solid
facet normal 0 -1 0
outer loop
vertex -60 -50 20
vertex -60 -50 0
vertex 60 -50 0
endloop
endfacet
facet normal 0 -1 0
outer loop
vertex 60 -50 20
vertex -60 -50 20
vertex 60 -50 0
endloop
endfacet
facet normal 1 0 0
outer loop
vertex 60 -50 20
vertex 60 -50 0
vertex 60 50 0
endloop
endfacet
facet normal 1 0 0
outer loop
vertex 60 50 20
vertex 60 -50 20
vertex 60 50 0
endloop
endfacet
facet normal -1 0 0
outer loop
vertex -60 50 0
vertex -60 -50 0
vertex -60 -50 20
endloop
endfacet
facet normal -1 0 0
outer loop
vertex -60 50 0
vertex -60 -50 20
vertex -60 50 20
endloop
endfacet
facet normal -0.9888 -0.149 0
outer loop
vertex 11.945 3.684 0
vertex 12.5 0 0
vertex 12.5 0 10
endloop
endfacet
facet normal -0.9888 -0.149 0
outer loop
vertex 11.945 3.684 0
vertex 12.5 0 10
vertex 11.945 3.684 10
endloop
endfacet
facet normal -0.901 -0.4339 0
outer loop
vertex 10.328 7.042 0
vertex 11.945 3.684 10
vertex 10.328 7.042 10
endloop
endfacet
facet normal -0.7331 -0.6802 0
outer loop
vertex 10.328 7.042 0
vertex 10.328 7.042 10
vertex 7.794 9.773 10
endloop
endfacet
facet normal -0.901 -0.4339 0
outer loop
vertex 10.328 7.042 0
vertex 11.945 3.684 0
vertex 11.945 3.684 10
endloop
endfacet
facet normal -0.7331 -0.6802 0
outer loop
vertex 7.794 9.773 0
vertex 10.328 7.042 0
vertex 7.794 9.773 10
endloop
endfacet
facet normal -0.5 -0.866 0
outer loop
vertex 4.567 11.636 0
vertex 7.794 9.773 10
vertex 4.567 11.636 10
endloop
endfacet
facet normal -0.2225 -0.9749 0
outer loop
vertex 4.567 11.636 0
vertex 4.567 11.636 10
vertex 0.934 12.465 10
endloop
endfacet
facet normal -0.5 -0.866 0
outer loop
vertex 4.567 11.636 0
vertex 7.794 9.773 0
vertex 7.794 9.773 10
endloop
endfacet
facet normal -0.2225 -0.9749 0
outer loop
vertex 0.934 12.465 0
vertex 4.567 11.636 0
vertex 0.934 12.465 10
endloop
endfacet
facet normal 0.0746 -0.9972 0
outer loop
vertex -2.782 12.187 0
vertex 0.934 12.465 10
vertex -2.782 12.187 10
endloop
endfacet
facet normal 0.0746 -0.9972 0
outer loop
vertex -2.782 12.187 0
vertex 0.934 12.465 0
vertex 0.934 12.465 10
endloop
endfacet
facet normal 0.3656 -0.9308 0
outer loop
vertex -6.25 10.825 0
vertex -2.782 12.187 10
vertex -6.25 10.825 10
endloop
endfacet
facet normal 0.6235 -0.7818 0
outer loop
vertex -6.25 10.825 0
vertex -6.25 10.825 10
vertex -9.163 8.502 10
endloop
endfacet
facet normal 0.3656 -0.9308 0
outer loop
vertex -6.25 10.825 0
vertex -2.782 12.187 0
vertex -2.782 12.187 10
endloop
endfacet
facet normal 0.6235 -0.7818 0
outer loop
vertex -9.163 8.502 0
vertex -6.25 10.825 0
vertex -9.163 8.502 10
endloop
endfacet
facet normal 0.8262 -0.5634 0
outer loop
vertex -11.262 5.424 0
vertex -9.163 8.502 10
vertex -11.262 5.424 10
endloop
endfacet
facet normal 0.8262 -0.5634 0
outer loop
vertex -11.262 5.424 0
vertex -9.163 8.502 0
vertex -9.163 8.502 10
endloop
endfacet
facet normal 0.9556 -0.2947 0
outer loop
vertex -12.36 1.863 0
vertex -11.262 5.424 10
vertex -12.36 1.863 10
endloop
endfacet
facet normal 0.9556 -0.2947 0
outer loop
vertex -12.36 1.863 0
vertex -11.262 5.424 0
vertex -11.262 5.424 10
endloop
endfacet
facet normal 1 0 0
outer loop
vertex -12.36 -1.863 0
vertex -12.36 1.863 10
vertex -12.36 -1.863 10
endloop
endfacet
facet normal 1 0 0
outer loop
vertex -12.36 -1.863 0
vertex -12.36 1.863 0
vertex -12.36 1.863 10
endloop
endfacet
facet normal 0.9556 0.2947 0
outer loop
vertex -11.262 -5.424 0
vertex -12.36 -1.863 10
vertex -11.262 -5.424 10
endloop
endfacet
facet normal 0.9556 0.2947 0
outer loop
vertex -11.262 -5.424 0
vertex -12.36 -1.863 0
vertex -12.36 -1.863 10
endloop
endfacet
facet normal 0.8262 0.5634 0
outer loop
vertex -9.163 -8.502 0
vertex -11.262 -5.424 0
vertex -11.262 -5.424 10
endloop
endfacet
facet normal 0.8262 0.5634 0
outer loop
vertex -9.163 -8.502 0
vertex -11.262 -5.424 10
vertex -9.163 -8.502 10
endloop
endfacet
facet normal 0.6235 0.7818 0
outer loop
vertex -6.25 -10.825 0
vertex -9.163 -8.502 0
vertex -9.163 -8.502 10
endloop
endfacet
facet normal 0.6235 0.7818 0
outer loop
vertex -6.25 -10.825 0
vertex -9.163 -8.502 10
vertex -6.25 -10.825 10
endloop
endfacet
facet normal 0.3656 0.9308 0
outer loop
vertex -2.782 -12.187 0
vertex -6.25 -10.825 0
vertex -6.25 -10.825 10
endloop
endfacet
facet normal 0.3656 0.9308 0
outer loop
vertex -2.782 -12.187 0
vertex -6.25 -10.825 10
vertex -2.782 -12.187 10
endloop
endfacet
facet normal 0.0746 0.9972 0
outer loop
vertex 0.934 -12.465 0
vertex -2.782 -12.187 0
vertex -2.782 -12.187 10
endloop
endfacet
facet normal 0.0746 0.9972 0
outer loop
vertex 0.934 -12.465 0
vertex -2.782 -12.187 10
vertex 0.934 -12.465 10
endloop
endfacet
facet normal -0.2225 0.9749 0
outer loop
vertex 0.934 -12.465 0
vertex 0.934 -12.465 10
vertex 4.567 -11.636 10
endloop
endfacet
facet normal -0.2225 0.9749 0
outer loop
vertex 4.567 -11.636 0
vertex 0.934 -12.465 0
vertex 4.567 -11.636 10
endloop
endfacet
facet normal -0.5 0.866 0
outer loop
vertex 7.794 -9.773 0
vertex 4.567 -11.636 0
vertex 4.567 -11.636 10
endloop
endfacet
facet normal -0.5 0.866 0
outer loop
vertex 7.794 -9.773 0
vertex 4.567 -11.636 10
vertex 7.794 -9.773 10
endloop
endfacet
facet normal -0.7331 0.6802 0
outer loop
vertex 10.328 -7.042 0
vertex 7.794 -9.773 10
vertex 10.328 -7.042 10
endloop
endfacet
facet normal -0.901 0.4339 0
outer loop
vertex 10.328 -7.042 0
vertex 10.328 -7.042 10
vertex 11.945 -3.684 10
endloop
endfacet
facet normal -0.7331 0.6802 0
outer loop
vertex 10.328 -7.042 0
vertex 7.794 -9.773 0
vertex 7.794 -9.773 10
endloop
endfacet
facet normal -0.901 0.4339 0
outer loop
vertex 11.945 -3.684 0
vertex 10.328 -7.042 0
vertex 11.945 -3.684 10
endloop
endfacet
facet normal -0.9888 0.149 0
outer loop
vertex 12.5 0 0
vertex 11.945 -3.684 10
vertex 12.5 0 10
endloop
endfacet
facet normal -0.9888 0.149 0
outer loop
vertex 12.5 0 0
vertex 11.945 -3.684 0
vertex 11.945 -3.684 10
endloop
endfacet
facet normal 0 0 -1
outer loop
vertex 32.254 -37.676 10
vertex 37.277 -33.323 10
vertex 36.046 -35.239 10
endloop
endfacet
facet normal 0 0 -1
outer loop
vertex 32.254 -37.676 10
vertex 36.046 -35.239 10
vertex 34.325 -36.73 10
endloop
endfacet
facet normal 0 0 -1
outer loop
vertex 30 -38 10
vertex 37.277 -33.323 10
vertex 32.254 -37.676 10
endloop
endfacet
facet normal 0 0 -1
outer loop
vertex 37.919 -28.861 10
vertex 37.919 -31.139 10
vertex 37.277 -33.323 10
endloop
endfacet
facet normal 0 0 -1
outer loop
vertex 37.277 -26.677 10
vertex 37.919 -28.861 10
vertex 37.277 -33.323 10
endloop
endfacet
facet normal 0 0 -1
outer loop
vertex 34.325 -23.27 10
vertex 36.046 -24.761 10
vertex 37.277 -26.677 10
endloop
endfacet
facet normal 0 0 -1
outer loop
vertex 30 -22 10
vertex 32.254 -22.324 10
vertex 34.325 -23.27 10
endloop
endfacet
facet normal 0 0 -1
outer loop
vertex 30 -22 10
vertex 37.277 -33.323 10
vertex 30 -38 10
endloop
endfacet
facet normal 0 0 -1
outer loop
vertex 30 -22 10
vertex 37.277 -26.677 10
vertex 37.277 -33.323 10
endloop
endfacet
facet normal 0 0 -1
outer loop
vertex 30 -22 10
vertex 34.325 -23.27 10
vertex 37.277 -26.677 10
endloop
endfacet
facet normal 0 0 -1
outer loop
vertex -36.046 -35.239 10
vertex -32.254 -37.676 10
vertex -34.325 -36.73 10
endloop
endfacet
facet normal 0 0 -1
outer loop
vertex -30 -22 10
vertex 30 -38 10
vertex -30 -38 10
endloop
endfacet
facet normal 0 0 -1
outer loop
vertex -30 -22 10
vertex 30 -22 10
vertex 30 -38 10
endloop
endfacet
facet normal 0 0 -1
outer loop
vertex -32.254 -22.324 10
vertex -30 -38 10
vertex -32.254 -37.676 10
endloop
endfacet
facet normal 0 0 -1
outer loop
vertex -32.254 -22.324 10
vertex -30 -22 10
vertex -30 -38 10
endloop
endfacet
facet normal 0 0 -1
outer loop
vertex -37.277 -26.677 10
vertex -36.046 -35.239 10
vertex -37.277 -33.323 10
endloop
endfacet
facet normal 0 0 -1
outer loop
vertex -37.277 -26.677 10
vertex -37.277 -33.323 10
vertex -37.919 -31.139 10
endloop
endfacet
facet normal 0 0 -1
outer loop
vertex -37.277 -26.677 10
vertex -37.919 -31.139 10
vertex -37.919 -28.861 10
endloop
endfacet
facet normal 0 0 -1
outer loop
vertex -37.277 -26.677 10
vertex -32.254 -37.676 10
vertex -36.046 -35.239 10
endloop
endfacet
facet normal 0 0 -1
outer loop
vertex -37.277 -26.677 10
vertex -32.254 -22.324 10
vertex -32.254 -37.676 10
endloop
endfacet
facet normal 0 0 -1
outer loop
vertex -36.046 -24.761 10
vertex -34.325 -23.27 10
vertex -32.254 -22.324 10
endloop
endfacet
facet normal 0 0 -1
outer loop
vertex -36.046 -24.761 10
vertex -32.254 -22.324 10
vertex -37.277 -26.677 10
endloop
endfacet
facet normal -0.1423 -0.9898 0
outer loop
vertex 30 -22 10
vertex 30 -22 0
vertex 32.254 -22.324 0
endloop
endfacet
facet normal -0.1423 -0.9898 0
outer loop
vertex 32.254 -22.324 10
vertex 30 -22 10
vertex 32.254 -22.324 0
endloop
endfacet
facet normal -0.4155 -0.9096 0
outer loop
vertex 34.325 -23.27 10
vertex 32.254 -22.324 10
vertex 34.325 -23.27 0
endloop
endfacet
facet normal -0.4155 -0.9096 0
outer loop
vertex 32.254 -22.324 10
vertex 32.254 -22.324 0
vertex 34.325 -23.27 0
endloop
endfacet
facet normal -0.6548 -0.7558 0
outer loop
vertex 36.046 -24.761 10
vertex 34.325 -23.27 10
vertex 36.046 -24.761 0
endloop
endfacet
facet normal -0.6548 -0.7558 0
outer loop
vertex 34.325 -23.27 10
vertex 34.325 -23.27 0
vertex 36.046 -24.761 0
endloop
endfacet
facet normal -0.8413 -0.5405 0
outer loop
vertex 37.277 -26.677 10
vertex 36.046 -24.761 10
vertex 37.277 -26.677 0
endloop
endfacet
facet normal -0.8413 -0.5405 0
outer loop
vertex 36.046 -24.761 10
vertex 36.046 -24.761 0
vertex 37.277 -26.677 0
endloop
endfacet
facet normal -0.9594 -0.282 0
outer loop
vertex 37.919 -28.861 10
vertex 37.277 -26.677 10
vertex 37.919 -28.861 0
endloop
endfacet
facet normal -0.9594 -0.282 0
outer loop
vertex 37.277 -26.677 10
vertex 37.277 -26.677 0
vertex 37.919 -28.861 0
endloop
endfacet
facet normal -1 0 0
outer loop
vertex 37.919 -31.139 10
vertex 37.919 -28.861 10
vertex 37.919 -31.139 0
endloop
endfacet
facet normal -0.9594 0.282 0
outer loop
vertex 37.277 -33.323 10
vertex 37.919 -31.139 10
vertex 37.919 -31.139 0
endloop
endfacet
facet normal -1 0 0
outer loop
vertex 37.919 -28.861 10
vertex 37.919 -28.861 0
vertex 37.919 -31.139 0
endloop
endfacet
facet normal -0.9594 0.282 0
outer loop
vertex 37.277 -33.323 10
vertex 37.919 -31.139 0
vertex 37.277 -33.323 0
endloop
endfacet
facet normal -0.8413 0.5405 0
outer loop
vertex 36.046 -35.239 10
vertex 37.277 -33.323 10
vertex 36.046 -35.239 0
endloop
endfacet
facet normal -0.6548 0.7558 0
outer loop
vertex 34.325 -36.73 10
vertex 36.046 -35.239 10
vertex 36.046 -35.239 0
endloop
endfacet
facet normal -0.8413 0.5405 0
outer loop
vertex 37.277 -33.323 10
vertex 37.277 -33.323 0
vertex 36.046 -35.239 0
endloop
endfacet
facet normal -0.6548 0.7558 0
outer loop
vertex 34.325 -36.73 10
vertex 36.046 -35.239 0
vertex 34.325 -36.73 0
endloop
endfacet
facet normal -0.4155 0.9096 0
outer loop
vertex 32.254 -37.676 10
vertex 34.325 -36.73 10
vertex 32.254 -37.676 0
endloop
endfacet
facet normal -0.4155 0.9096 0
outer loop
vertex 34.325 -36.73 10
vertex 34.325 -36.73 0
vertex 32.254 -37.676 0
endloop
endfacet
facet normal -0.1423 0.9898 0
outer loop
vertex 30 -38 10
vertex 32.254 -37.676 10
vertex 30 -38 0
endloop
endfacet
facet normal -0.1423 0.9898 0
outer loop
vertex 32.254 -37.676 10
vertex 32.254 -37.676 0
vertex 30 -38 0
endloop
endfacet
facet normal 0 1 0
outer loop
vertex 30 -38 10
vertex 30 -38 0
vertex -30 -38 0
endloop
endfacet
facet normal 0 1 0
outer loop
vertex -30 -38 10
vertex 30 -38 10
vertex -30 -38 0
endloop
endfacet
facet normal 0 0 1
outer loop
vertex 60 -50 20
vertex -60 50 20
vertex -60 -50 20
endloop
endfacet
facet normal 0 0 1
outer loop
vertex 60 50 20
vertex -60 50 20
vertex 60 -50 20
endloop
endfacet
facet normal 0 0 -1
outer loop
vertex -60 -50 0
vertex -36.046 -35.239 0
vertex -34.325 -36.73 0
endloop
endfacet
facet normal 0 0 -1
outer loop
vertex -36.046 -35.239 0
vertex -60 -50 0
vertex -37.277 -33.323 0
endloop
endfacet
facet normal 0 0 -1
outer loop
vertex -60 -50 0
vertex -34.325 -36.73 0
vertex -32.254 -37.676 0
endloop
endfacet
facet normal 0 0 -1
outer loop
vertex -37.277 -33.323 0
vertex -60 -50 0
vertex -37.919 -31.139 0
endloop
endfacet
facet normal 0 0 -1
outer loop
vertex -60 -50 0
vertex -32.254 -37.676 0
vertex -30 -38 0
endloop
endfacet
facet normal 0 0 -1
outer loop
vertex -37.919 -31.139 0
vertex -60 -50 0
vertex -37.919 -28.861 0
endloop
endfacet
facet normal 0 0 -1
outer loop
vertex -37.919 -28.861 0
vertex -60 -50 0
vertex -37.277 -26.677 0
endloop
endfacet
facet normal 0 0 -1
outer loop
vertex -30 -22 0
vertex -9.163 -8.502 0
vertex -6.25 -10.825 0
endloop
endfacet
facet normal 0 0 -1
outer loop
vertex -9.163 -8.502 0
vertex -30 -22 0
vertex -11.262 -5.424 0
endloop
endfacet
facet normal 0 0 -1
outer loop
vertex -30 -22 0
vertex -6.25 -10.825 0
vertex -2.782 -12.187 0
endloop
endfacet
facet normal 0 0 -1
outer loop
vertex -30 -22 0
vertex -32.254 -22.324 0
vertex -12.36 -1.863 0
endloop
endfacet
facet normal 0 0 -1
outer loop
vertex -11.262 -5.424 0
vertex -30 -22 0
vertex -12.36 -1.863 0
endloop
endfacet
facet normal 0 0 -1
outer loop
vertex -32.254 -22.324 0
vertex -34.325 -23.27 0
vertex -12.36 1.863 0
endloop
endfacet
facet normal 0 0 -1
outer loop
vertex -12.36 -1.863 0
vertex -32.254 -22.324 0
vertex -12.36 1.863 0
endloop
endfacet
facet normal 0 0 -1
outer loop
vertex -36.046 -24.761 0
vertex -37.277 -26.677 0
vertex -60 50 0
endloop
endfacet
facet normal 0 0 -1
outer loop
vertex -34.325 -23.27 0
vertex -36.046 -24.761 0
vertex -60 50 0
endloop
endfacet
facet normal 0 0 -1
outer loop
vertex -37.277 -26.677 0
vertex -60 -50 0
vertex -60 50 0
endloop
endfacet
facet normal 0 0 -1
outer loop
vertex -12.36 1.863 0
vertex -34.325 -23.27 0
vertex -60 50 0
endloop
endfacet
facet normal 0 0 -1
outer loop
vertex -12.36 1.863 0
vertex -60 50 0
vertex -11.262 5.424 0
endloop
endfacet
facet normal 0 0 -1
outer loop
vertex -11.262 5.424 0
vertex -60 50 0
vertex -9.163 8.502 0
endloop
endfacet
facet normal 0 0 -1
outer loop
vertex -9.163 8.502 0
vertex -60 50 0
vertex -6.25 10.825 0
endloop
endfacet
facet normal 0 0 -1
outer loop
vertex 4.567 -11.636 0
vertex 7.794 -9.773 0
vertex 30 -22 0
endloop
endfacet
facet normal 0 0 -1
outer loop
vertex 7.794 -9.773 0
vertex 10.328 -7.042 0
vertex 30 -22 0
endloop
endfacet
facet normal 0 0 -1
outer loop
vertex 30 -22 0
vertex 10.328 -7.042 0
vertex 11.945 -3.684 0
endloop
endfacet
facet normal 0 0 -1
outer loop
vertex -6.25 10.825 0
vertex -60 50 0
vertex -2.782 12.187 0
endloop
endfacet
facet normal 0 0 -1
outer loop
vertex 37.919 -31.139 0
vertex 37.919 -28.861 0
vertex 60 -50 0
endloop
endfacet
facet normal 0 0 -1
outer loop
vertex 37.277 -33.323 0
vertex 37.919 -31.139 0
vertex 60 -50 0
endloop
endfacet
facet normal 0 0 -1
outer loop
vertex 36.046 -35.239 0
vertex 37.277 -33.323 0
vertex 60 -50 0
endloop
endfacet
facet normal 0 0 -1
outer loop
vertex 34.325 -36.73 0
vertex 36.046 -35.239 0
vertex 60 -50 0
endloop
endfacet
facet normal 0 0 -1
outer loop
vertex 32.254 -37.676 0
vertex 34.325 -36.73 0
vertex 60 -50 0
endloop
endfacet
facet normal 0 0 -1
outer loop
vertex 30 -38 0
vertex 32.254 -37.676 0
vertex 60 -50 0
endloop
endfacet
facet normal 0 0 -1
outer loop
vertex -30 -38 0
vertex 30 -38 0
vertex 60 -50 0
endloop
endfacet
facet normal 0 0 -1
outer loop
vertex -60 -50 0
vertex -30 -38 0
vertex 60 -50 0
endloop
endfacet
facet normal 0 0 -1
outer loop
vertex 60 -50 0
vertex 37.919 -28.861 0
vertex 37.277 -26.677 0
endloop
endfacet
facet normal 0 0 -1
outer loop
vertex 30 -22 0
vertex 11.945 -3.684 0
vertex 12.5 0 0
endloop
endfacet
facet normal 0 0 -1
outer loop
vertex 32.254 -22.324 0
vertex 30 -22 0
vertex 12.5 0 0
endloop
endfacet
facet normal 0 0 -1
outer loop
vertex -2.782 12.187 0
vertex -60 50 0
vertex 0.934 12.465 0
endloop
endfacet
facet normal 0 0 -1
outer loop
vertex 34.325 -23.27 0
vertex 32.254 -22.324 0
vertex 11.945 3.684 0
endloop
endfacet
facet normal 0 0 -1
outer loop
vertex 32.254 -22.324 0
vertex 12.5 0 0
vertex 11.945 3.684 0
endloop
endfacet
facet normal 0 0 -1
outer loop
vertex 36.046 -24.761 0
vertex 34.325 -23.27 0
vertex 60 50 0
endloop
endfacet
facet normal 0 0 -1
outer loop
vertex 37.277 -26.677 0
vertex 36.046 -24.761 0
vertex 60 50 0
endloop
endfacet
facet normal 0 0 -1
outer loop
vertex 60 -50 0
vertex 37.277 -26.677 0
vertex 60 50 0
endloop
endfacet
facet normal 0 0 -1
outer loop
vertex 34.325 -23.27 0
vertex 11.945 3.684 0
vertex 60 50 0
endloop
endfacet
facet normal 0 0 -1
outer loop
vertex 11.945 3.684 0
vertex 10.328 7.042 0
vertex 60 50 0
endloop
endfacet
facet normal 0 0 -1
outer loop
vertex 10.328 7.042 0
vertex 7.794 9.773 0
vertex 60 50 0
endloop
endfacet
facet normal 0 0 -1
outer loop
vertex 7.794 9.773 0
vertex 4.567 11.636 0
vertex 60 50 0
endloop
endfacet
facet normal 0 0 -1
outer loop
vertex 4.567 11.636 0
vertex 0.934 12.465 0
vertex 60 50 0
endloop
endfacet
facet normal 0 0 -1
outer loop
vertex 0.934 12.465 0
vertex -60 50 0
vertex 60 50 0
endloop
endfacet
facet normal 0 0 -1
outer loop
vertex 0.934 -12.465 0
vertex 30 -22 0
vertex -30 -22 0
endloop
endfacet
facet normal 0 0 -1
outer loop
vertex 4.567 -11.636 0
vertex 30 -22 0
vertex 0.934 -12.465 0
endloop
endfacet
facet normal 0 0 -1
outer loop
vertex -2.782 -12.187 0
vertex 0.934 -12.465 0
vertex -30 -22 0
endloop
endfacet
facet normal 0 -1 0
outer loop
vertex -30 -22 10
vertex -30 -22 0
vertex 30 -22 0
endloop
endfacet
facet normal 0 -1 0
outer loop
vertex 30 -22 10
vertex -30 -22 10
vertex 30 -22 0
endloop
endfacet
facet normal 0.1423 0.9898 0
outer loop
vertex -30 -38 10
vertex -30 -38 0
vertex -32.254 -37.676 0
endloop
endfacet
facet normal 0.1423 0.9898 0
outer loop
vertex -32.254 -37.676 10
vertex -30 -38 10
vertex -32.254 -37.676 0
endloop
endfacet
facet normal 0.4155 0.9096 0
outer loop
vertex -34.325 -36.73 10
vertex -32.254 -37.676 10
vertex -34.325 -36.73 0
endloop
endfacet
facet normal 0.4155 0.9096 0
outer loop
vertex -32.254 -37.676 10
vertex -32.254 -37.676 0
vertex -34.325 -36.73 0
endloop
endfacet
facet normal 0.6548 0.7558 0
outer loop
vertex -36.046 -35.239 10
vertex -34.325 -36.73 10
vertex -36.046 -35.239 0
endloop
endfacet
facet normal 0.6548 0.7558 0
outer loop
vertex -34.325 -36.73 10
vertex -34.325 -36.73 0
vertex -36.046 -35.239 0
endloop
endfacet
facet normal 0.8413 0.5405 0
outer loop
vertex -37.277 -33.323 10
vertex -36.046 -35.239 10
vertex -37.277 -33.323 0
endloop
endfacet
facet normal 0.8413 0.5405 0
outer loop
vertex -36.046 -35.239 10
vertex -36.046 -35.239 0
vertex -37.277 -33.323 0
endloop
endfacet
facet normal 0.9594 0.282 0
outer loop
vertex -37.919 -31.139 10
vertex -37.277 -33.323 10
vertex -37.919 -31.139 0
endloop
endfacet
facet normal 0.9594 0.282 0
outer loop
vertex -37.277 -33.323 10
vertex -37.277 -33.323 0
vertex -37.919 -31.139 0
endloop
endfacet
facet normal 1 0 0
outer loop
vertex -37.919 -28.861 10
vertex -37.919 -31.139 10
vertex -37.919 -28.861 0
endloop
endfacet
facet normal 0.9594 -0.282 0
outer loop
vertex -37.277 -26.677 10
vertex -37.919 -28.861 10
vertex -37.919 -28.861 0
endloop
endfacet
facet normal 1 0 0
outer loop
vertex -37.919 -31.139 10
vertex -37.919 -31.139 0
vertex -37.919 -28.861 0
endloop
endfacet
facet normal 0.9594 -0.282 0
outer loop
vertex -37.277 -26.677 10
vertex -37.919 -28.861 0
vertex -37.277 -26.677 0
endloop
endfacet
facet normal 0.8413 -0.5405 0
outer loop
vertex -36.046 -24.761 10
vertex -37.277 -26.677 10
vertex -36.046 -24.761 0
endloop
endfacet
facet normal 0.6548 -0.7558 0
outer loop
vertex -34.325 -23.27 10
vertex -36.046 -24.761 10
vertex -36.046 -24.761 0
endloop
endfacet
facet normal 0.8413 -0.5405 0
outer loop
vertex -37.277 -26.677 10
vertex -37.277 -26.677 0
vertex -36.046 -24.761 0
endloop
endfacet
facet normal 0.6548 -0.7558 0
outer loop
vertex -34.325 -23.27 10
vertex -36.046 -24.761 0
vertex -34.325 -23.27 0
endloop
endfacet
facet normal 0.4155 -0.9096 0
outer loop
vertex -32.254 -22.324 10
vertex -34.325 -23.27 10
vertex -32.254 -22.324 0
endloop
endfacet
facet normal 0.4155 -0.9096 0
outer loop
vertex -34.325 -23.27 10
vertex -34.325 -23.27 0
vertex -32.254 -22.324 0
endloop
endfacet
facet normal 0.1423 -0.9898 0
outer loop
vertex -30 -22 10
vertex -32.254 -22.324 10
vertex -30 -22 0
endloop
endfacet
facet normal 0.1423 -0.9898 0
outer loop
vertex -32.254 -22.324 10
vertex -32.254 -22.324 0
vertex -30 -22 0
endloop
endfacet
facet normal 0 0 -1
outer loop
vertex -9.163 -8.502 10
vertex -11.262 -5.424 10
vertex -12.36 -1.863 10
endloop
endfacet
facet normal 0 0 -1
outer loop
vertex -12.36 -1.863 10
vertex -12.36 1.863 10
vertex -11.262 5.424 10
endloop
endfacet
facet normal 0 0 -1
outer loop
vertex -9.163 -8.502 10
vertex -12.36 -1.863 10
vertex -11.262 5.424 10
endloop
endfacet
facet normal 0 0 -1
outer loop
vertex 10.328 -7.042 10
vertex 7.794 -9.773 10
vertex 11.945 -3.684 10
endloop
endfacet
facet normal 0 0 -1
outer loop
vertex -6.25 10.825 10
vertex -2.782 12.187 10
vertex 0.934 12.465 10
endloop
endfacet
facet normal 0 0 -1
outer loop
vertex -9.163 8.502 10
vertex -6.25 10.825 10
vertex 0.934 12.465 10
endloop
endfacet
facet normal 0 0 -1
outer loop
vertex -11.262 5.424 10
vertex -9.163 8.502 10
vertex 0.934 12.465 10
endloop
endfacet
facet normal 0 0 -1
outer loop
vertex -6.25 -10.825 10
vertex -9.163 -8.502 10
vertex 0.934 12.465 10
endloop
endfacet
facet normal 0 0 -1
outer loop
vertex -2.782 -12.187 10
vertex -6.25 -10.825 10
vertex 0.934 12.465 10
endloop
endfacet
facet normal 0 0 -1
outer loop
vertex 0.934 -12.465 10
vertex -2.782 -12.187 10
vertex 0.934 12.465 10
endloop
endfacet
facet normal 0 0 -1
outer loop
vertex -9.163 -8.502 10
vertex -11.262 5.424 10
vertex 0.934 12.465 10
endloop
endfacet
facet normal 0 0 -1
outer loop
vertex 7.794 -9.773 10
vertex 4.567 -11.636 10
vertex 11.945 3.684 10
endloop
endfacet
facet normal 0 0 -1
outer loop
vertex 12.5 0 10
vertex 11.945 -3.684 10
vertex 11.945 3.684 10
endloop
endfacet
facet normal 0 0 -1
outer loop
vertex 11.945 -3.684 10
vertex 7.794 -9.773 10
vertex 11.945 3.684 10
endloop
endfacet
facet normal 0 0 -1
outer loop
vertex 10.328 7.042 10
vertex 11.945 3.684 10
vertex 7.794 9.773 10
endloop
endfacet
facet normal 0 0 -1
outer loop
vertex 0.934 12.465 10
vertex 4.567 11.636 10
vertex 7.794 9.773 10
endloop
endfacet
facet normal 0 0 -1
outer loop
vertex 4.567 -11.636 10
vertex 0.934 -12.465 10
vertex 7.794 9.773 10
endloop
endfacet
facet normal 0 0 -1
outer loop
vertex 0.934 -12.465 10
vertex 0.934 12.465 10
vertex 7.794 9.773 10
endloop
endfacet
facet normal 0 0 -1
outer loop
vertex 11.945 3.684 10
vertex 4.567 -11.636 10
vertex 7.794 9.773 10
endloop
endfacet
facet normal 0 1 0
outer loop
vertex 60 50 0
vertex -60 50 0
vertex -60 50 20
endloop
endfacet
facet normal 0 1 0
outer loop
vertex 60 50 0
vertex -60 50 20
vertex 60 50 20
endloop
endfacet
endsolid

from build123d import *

# Parameters (mm, degrees)
SKETCH_1_W          = 120
SKETCH_1_H          = 100
EXTRUDE_1_DEPTH     = 20
SKETCH_1_3_R        = 12.5
CUT_EXTRUDE_2_DEPTH = 10


with BuildPart() as part:
    # 草图1 → 凸台-拉伸1 (new body)
    with BuildSketch(Plane.XY):
        Rectangle(SKETCH_1_W, SKETCH_1_H)
    extrude(amount=EXTRUDE_1_DEPTH)

    # 草图1<3> → 切除-拉伸2 (cut)
    with BuildSketch(Plane.XY):
        Circle(SKETCH_1_3_R)
        with BuildLine():
            Line((-30, -22), (30, -22))
            ThreePointArc((30, -22), (38, -30), (30, -38))
            Line((30, -38), (-30, -38))
            ThreePointArc((-30, -38), (-38, -30), (-30, -22))
        make_face()
    extrude(amount=CUT_EXTRUDE_2_DEPTH, mode=Mode.SUBTRACT)


solid = part.part
